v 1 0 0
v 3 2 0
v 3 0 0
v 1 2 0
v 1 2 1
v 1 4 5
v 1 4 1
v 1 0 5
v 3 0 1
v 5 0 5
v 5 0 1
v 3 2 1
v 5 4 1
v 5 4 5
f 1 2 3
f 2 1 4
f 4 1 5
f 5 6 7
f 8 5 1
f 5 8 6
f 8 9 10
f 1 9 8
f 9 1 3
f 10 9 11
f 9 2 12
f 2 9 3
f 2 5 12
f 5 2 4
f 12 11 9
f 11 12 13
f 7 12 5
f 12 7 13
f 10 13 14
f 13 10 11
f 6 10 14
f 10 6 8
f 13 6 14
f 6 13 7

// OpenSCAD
module A() {
  cube(1);
  cube(2);
}

module B() {
  cube(3);
  cube(4);
  translate([0, 1, 0]) A();
}

translate([1, 0, 0]) {
  A();
  translate([0, 0, 1]) B();
}
